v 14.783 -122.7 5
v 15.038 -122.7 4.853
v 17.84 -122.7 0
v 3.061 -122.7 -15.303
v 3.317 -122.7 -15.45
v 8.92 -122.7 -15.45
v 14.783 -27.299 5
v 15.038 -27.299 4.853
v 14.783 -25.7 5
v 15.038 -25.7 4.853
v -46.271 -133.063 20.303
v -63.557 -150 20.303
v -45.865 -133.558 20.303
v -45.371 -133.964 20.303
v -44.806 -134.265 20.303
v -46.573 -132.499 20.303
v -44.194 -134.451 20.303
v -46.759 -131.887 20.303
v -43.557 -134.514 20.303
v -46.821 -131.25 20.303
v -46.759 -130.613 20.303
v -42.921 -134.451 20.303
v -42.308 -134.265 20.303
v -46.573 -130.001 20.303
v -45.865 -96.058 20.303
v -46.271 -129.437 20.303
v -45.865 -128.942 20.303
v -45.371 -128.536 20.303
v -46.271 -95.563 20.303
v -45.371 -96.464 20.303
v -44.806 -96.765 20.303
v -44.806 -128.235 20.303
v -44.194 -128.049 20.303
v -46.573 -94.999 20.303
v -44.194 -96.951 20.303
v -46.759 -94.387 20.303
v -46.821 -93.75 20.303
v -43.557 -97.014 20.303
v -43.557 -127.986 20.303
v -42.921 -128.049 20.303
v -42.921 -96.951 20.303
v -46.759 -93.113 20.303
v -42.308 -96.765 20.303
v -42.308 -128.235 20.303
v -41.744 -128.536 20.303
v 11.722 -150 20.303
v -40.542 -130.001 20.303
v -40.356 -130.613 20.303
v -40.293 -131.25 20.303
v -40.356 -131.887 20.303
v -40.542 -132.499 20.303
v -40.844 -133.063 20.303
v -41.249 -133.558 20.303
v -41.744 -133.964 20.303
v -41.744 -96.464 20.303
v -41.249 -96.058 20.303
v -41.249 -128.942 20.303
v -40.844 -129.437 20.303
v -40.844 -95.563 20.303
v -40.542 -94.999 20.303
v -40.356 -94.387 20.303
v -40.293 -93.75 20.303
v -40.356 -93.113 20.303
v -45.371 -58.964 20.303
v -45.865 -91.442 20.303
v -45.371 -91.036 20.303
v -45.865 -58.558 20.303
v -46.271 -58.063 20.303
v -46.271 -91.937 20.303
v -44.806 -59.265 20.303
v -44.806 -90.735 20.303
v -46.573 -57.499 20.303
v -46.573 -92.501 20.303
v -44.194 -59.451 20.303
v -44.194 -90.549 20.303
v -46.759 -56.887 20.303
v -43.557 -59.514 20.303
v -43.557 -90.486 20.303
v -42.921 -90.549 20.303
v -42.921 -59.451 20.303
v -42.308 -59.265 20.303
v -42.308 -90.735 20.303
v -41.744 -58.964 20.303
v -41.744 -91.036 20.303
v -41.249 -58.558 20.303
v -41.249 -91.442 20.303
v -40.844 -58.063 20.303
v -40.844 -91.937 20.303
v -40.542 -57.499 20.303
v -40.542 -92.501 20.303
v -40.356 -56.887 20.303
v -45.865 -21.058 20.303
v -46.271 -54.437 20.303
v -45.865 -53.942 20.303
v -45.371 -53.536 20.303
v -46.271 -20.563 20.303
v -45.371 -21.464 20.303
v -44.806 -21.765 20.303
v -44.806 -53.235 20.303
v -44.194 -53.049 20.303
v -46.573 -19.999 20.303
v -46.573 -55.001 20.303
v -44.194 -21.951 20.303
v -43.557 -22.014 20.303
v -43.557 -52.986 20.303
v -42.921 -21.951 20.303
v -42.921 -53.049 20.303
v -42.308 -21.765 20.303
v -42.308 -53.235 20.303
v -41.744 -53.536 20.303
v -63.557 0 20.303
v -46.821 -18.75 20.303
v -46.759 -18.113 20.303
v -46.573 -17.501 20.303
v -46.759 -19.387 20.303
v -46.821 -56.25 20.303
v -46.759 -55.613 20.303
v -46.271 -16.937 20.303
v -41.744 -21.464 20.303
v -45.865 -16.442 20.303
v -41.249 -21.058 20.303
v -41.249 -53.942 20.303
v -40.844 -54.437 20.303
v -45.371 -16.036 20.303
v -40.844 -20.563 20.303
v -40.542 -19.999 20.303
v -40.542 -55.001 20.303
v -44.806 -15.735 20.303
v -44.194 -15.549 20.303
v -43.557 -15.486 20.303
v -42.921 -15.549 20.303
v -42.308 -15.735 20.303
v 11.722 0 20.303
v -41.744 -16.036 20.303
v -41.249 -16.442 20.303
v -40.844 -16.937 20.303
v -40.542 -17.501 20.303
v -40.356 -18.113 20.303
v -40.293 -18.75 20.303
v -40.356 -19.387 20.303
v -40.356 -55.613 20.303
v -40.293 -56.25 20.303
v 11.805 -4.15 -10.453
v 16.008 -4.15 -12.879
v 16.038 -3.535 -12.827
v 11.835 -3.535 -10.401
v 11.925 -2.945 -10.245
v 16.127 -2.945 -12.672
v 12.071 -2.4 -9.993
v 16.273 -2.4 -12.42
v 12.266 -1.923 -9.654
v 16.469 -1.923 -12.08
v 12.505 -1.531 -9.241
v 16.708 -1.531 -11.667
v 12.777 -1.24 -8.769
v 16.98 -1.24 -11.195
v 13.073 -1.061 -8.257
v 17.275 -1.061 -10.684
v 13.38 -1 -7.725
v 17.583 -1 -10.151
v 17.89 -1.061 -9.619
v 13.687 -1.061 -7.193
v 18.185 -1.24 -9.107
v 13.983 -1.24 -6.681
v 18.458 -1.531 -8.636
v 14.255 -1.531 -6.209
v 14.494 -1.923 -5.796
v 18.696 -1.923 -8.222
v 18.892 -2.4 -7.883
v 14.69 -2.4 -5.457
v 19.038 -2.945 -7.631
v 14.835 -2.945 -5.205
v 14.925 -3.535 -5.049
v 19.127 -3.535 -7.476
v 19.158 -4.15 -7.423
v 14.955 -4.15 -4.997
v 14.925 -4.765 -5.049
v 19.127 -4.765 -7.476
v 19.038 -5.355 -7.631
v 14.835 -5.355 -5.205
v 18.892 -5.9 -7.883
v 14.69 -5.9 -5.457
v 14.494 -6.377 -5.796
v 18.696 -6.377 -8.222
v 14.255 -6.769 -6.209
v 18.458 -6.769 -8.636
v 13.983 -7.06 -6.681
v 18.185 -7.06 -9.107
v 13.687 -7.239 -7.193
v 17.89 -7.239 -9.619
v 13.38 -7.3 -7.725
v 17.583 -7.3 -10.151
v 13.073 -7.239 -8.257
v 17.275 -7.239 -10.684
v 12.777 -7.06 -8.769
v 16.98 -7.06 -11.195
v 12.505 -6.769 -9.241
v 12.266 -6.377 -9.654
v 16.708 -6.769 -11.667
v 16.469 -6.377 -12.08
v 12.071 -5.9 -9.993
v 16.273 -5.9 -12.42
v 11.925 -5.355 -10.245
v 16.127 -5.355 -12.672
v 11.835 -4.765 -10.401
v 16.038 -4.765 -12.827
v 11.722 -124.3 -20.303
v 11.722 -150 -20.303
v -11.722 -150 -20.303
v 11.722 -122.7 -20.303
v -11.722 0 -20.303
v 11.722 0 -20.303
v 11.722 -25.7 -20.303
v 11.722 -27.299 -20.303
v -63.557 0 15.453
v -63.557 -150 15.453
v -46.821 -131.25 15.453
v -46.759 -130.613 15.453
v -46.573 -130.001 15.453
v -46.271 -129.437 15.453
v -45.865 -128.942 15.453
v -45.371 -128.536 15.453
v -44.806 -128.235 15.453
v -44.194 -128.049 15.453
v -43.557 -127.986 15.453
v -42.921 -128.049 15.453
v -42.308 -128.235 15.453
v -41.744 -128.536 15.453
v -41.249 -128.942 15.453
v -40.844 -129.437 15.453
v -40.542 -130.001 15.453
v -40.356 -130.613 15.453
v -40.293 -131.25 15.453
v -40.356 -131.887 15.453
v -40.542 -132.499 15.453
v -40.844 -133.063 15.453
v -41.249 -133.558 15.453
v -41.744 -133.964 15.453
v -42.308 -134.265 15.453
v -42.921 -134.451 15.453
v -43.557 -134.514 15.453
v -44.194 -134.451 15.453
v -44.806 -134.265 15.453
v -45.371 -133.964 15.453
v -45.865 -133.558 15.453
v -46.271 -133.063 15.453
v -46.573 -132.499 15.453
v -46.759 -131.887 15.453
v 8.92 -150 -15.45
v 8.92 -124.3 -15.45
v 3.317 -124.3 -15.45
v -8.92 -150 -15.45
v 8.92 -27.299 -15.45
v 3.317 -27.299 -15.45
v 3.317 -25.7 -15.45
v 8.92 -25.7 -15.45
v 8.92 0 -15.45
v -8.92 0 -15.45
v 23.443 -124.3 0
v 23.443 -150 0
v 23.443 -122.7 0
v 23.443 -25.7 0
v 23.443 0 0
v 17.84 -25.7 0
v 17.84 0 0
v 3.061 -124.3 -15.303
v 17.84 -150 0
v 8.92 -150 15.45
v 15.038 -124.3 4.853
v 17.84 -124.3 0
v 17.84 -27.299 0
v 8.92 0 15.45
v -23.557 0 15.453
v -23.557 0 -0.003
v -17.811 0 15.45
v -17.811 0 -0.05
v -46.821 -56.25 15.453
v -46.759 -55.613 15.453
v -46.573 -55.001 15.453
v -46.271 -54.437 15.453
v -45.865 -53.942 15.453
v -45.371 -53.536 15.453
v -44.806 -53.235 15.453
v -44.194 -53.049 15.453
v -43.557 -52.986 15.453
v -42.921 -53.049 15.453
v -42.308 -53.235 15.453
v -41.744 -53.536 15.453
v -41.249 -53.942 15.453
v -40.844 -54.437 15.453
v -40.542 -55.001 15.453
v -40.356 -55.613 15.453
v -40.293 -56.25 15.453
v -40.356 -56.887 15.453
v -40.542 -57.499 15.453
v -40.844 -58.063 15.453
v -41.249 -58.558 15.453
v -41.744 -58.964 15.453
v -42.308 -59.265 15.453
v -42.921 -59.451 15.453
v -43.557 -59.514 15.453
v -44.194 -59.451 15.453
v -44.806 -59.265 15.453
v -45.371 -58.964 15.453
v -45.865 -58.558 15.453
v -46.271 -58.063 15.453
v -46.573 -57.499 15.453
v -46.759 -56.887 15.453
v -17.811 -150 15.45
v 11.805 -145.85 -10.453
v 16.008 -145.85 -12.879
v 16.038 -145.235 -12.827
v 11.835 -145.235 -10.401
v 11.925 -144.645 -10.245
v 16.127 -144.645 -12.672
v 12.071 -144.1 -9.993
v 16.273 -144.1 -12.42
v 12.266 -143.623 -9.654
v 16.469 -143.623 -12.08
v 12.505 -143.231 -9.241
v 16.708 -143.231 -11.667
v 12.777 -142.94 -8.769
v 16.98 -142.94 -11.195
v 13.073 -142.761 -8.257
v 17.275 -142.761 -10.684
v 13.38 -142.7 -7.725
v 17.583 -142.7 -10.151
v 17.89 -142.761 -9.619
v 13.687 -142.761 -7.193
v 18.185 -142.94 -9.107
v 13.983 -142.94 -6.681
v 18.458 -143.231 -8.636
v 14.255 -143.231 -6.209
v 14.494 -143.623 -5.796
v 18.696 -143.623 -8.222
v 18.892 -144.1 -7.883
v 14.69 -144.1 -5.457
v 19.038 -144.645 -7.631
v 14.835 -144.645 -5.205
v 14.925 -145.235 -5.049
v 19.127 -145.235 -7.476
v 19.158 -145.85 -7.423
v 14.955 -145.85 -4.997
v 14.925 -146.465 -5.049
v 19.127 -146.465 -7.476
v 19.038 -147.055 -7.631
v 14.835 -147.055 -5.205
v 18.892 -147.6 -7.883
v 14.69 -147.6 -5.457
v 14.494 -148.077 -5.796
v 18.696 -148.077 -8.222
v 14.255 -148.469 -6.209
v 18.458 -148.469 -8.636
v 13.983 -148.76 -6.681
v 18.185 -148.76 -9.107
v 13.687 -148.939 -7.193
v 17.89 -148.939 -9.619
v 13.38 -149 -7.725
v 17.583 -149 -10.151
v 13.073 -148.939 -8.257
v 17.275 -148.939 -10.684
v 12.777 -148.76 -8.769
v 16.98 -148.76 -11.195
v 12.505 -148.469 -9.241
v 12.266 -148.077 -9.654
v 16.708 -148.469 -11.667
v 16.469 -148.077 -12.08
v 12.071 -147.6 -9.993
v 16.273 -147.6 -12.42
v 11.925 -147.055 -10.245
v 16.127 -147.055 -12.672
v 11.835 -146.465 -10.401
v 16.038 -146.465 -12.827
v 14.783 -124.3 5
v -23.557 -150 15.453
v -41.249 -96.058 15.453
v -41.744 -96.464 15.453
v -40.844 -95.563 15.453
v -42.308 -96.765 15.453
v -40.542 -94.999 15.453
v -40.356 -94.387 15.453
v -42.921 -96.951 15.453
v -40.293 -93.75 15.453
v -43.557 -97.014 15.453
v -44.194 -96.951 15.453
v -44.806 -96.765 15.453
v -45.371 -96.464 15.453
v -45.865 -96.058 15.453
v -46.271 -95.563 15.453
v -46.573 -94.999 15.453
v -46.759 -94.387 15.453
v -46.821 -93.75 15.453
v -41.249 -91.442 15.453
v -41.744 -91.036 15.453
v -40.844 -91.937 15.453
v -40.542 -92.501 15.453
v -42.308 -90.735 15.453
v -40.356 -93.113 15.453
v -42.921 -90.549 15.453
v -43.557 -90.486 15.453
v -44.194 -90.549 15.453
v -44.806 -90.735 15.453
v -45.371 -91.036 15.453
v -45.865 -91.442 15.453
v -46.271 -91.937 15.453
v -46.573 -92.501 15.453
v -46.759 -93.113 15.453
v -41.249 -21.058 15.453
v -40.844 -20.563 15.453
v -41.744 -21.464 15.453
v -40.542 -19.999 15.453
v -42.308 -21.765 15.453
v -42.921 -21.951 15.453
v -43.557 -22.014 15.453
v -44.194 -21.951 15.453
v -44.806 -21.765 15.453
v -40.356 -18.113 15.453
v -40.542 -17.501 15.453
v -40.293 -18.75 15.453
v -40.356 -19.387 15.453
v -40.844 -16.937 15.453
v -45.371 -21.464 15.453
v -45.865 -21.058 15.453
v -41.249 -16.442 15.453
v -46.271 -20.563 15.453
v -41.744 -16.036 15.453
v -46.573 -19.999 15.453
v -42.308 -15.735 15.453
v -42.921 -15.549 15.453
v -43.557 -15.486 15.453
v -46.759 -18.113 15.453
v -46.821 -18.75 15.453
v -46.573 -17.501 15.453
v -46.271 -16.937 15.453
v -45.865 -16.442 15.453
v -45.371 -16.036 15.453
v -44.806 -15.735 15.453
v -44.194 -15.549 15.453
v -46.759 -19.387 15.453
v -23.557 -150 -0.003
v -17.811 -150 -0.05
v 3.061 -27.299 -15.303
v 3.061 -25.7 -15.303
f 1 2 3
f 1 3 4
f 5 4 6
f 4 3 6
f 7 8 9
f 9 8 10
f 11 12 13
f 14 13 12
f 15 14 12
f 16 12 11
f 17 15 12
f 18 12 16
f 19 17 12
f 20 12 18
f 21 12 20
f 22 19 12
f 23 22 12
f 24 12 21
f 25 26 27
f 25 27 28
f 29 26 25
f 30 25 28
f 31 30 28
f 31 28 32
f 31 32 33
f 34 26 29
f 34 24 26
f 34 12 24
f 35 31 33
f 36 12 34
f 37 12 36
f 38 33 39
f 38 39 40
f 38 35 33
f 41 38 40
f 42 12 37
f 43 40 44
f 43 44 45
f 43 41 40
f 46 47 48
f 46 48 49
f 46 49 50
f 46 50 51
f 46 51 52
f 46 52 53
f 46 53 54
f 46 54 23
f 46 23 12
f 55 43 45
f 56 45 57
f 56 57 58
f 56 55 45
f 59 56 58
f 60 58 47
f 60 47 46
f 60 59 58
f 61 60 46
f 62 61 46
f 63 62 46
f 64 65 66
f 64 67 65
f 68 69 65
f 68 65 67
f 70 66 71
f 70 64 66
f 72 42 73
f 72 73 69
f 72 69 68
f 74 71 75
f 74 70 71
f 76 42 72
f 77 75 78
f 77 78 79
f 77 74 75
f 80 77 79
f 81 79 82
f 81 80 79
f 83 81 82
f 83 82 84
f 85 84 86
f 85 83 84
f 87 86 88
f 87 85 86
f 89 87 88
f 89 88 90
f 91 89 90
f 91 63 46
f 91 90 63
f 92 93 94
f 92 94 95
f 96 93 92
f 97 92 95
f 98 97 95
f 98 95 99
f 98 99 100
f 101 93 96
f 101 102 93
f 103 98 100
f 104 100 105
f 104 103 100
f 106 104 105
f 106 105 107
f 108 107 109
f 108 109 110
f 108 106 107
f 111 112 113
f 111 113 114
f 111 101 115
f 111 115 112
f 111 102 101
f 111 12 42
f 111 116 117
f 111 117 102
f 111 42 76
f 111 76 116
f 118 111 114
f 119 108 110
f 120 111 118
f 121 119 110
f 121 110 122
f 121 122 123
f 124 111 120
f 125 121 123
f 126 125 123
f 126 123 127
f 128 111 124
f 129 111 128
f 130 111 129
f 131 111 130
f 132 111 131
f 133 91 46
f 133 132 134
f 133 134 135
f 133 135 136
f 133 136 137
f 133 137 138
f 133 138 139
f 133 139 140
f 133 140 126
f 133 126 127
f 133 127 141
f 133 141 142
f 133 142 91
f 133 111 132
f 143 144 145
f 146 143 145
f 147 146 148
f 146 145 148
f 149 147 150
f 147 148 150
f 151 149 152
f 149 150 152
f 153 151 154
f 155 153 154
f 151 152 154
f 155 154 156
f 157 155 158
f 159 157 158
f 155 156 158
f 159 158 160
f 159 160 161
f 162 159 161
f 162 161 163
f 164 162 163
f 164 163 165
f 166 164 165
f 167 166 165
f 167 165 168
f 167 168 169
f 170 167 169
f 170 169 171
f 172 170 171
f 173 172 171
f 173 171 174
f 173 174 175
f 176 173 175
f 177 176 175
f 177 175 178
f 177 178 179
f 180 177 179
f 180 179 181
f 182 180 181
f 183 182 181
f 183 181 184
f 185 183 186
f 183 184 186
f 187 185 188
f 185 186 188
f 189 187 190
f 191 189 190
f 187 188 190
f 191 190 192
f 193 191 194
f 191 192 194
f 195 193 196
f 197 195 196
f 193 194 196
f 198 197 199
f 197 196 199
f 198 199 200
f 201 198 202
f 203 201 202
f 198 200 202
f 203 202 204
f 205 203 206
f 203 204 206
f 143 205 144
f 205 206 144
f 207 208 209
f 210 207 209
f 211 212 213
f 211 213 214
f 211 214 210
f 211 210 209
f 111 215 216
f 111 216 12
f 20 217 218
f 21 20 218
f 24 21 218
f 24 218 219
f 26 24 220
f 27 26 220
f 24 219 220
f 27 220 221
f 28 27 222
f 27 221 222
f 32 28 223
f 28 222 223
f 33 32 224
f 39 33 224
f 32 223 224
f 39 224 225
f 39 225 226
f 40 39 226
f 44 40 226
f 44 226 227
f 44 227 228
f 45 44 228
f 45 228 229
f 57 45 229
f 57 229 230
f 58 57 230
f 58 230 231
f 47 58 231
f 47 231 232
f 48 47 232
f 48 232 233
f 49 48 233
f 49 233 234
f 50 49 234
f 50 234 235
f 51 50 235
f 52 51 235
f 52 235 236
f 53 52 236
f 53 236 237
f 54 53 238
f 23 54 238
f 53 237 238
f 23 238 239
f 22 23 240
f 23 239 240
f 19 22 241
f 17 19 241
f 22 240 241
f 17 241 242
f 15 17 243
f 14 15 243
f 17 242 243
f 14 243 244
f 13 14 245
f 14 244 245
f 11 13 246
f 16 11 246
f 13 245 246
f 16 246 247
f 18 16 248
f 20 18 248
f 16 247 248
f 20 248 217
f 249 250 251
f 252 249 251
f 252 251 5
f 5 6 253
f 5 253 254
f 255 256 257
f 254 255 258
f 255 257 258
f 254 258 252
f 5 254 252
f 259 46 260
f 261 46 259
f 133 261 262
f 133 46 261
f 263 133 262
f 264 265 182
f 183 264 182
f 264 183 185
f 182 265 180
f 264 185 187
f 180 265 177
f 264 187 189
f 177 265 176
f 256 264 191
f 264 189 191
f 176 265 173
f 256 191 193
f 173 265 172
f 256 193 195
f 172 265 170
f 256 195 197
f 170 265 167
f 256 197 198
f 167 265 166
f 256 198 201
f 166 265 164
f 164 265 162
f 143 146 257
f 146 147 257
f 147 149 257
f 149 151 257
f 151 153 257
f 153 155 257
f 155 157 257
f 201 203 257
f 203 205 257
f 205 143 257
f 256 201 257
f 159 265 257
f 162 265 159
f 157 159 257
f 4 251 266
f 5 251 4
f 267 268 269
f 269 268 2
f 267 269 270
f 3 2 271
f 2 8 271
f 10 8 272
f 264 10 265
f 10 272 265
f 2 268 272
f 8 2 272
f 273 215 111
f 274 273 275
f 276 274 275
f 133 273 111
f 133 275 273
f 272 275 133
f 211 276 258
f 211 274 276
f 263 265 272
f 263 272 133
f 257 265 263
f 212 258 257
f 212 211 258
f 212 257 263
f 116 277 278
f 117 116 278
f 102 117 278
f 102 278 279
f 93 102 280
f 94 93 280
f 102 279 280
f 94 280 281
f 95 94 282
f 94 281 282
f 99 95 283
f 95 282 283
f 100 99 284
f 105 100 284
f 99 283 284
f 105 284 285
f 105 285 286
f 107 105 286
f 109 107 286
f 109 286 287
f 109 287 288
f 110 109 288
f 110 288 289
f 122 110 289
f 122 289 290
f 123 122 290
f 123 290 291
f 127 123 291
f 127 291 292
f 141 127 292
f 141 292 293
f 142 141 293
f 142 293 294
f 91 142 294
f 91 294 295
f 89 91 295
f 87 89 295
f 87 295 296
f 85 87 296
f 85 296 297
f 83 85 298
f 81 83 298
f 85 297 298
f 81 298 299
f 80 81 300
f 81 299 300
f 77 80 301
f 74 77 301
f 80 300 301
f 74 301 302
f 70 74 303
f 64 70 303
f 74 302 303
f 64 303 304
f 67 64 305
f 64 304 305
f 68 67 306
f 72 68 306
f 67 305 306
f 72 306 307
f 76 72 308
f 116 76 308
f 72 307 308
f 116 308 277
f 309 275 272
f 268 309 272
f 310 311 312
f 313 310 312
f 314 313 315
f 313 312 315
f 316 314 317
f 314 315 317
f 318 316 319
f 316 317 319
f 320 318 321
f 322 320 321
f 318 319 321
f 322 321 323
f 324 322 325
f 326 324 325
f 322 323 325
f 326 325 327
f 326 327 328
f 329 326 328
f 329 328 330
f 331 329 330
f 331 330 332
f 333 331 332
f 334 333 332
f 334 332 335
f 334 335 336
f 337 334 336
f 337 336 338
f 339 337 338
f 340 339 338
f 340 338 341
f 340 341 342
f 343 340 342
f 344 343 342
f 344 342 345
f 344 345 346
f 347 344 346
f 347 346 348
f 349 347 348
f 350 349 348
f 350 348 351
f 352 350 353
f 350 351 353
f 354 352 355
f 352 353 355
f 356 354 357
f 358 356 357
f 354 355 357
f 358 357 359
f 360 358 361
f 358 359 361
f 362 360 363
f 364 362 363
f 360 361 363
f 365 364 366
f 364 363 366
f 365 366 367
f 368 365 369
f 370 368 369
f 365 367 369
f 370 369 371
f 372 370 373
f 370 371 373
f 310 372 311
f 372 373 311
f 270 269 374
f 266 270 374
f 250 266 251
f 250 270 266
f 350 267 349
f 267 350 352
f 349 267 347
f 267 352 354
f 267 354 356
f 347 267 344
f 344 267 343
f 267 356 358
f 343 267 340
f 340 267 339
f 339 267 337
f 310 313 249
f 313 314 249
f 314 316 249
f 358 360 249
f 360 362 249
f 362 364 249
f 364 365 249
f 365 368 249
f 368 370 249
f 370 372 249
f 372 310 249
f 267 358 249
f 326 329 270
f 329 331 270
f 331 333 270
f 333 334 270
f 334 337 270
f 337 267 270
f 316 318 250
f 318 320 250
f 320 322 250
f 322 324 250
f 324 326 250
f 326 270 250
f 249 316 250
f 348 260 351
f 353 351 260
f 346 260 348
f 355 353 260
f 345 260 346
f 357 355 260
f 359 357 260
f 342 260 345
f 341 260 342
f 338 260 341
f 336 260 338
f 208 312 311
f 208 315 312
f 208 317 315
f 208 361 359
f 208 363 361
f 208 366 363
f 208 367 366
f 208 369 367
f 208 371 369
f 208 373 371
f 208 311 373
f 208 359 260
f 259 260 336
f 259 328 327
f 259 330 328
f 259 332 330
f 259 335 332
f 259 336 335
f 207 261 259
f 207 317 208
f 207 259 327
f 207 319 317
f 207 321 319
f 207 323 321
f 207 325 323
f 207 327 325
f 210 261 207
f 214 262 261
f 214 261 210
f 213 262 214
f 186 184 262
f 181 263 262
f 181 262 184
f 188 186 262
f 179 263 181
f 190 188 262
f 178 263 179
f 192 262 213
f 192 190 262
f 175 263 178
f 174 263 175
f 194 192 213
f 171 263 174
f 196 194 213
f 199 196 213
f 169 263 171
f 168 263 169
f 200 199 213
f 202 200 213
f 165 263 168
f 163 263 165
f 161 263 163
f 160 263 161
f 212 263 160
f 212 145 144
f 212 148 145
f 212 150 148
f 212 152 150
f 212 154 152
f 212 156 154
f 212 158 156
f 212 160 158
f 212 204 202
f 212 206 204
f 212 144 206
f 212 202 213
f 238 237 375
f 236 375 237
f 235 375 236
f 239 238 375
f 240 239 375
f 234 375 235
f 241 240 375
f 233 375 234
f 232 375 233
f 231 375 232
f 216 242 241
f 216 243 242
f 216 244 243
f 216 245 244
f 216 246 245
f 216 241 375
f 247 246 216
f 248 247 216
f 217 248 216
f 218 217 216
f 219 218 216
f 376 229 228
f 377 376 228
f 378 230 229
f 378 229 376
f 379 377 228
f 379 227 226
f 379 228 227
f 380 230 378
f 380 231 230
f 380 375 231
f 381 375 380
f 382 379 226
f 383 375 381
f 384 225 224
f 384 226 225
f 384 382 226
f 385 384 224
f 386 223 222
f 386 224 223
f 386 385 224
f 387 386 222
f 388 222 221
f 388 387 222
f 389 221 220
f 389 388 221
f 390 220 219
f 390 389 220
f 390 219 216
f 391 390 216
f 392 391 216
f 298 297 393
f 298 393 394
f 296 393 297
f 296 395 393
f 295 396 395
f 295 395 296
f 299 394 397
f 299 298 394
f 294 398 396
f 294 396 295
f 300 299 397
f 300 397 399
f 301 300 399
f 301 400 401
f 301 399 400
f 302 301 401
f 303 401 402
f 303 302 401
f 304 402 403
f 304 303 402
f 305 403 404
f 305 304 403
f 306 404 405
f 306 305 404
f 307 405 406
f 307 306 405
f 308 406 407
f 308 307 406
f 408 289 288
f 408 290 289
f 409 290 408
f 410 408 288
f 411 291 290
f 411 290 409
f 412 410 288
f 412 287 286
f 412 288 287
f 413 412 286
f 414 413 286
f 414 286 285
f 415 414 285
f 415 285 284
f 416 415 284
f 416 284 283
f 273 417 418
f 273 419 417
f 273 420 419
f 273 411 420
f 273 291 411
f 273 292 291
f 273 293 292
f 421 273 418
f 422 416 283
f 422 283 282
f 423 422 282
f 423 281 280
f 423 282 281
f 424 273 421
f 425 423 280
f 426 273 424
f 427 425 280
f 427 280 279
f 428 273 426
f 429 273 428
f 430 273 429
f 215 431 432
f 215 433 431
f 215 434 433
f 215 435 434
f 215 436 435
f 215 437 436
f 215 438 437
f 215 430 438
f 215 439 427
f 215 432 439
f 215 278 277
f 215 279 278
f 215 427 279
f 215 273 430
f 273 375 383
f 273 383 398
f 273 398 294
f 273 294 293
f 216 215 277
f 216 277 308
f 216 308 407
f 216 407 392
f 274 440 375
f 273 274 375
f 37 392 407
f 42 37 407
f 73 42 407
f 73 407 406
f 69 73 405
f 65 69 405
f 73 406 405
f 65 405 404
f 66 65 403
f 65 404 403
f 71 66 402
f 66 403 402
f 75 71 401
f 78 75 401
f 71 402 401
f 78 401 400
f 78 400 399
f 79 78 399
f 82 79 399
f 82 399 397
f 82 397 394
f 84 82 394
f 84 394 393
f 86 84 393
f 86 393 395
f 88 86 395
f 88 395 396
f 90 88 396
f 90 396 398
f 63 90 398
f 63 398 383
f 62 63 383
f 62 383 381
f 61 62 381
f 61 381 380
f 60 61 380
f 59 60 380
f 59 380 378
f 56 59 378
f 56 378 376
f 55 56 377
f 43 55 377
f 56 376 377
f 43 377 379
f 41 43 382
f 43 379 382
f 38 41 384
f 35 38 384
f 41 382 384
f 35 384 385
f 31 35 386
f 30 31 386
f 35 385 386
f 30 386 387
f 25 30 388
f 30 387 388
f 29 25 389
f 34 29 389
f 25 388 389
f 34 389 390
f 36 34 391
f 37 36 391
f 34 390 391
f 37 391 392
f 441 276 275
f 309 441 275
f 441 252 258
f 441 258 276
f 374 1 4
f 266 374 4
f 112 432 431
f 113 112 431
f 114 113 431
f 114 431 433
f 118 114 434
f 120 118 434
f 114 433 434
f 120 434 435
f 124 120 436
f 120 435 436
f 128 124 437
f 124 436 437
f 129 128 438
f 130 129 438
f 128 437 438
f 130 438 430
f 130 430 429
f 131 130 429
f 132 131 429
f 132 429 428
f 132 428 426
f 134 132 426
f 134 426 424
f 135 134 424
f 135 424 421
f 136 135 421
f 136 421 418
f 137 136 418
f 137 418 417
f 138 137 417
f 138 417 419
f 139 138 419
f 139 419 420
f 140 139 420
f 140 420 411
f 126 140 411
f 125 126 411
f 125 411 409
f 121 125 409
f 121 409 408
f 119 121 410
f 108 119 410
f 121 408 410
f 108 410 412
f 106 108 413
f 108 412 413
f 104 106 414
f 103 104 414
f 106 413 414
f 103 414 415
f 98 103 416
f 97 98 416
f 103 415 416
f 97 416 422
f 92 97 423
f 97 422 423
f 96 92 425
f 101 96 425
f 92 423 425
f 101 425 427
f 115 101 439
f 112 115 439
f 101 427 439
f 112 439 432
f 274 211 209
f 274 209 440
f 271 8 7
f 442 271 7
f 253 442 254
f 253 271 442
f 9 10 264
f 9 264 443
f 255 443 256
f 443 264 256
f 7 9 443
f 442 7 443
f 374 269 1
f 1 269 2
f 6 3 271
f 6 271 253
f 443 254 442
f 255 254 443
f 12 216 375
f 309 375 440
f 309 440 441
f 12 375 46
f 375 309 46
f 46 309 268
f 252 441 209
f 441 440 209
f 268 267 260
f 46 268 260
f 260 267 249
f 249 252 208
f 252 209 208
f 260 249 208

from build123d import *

# Parameters (mm, degrees)
BOSS_EXTRUDE3_DEPTH = 150
SKETCH5_R           = 3.2639
CUT_EXTRUDE1_DEPTH  = 10
SKETCH6_R           = 3.15
CUT_EXTRUDE3_DEPTH  = 10
SKETCH7_W           = 23.443423468
SKETCH7_H           = 1.599424748
SKETCH7_H_2         = 1.6
BOSS_EXTRUDE4_DEPTH = 10


with BuildPart() as part:
    # Sketch4 → Boss-Extrude3 (new body)
    with BuildSketch(Plane(origin=(0, 0, 0), x_dir=(1, 0, 0), z_dir=(0, 1, 0))):
        Polygon((-23.557392252, 0.002600275), (-23.557392252, -15.452600275), (-63.557392252, -15.452600275), (-63.557392252, -20.302600275), (11.721711734, -20.302600275), (23.443423468, 0), (11.721711734, 20.302600275), (-11.721711734, 20.302600275), align=None)
        Polygon((-17.811255804, 0.05), (-17.811255804, -15.45), (8.920061659, -15.45), (17.840123318, 0), (8.920061659, 15.45), (-8.920061659, 15.45), align=None, mode=Mode.SUBTRACT)
    extrude(amount=-BOSS_EXTRUDE3_DEPTH)

    # Sketch5 → Cut-Extrude1 (cut)
    with BuildSketch(Plane(origin=(0, 0, 15.452600275), x_dir=(-1, 0, 0), z_dir=(0, 0, -1))):
        with Locations((43.557392252, -131.25)):
            Circle(SKETCH5_R)
        with Locations((43.557392252, -93.75)):
            Circle(SKETCH5_R)
        with Locations((43.557392252, -56.25)):
            Circle(SKETCH5_R)
        with Locations((43.557392252, -18.75)):
            Circle(SKETCH5_R)
    extrude(amount=-CUT_EXTRUDE1_DEPTH, mode=Mode.SUBTRACT)

    # Sketch6 → Cut-Extrude3 (cut)
    with BuildSketch(Plane(origin=(17.582567601, 0, -10.151300137), x_dir=(-0.4999999999999999, 0, -0.8660254037844387), z_dir=(0.8660254037844387, 0, -0.4999999999999999))):
        with Locations((0, -4.15)):
            Circle(SKETCH6_R)
        with Locations((0, -145.85)):
            Circle(SKETCH6_R)
    extrude(amount=-CUT_EXTRUDE3_DEPTH, mode=Mode.SUBTRACT)

    # Sketch7 → Boss-Extrude4 (add)
    with BuildSketch(Plane(origin=(17.582567601, 0, -10.151300137), x_dir=(-0.4999999999999999, 0, -0.8660254037844387), z_dir=(0.8660254037844387, 0, -0.4999999999999999))):
        with Locations((0, -26.499712374)):
            Rectangle(SKETCH7_W, SKETCH7_H)
        with Locations((0, -123.5)):
            Rectangle(SKETCH7_W, SKETCH7_H_2)
    extrude(amount=-BOSS_EXTRUDE4_DEPTH)


solid = part.part
